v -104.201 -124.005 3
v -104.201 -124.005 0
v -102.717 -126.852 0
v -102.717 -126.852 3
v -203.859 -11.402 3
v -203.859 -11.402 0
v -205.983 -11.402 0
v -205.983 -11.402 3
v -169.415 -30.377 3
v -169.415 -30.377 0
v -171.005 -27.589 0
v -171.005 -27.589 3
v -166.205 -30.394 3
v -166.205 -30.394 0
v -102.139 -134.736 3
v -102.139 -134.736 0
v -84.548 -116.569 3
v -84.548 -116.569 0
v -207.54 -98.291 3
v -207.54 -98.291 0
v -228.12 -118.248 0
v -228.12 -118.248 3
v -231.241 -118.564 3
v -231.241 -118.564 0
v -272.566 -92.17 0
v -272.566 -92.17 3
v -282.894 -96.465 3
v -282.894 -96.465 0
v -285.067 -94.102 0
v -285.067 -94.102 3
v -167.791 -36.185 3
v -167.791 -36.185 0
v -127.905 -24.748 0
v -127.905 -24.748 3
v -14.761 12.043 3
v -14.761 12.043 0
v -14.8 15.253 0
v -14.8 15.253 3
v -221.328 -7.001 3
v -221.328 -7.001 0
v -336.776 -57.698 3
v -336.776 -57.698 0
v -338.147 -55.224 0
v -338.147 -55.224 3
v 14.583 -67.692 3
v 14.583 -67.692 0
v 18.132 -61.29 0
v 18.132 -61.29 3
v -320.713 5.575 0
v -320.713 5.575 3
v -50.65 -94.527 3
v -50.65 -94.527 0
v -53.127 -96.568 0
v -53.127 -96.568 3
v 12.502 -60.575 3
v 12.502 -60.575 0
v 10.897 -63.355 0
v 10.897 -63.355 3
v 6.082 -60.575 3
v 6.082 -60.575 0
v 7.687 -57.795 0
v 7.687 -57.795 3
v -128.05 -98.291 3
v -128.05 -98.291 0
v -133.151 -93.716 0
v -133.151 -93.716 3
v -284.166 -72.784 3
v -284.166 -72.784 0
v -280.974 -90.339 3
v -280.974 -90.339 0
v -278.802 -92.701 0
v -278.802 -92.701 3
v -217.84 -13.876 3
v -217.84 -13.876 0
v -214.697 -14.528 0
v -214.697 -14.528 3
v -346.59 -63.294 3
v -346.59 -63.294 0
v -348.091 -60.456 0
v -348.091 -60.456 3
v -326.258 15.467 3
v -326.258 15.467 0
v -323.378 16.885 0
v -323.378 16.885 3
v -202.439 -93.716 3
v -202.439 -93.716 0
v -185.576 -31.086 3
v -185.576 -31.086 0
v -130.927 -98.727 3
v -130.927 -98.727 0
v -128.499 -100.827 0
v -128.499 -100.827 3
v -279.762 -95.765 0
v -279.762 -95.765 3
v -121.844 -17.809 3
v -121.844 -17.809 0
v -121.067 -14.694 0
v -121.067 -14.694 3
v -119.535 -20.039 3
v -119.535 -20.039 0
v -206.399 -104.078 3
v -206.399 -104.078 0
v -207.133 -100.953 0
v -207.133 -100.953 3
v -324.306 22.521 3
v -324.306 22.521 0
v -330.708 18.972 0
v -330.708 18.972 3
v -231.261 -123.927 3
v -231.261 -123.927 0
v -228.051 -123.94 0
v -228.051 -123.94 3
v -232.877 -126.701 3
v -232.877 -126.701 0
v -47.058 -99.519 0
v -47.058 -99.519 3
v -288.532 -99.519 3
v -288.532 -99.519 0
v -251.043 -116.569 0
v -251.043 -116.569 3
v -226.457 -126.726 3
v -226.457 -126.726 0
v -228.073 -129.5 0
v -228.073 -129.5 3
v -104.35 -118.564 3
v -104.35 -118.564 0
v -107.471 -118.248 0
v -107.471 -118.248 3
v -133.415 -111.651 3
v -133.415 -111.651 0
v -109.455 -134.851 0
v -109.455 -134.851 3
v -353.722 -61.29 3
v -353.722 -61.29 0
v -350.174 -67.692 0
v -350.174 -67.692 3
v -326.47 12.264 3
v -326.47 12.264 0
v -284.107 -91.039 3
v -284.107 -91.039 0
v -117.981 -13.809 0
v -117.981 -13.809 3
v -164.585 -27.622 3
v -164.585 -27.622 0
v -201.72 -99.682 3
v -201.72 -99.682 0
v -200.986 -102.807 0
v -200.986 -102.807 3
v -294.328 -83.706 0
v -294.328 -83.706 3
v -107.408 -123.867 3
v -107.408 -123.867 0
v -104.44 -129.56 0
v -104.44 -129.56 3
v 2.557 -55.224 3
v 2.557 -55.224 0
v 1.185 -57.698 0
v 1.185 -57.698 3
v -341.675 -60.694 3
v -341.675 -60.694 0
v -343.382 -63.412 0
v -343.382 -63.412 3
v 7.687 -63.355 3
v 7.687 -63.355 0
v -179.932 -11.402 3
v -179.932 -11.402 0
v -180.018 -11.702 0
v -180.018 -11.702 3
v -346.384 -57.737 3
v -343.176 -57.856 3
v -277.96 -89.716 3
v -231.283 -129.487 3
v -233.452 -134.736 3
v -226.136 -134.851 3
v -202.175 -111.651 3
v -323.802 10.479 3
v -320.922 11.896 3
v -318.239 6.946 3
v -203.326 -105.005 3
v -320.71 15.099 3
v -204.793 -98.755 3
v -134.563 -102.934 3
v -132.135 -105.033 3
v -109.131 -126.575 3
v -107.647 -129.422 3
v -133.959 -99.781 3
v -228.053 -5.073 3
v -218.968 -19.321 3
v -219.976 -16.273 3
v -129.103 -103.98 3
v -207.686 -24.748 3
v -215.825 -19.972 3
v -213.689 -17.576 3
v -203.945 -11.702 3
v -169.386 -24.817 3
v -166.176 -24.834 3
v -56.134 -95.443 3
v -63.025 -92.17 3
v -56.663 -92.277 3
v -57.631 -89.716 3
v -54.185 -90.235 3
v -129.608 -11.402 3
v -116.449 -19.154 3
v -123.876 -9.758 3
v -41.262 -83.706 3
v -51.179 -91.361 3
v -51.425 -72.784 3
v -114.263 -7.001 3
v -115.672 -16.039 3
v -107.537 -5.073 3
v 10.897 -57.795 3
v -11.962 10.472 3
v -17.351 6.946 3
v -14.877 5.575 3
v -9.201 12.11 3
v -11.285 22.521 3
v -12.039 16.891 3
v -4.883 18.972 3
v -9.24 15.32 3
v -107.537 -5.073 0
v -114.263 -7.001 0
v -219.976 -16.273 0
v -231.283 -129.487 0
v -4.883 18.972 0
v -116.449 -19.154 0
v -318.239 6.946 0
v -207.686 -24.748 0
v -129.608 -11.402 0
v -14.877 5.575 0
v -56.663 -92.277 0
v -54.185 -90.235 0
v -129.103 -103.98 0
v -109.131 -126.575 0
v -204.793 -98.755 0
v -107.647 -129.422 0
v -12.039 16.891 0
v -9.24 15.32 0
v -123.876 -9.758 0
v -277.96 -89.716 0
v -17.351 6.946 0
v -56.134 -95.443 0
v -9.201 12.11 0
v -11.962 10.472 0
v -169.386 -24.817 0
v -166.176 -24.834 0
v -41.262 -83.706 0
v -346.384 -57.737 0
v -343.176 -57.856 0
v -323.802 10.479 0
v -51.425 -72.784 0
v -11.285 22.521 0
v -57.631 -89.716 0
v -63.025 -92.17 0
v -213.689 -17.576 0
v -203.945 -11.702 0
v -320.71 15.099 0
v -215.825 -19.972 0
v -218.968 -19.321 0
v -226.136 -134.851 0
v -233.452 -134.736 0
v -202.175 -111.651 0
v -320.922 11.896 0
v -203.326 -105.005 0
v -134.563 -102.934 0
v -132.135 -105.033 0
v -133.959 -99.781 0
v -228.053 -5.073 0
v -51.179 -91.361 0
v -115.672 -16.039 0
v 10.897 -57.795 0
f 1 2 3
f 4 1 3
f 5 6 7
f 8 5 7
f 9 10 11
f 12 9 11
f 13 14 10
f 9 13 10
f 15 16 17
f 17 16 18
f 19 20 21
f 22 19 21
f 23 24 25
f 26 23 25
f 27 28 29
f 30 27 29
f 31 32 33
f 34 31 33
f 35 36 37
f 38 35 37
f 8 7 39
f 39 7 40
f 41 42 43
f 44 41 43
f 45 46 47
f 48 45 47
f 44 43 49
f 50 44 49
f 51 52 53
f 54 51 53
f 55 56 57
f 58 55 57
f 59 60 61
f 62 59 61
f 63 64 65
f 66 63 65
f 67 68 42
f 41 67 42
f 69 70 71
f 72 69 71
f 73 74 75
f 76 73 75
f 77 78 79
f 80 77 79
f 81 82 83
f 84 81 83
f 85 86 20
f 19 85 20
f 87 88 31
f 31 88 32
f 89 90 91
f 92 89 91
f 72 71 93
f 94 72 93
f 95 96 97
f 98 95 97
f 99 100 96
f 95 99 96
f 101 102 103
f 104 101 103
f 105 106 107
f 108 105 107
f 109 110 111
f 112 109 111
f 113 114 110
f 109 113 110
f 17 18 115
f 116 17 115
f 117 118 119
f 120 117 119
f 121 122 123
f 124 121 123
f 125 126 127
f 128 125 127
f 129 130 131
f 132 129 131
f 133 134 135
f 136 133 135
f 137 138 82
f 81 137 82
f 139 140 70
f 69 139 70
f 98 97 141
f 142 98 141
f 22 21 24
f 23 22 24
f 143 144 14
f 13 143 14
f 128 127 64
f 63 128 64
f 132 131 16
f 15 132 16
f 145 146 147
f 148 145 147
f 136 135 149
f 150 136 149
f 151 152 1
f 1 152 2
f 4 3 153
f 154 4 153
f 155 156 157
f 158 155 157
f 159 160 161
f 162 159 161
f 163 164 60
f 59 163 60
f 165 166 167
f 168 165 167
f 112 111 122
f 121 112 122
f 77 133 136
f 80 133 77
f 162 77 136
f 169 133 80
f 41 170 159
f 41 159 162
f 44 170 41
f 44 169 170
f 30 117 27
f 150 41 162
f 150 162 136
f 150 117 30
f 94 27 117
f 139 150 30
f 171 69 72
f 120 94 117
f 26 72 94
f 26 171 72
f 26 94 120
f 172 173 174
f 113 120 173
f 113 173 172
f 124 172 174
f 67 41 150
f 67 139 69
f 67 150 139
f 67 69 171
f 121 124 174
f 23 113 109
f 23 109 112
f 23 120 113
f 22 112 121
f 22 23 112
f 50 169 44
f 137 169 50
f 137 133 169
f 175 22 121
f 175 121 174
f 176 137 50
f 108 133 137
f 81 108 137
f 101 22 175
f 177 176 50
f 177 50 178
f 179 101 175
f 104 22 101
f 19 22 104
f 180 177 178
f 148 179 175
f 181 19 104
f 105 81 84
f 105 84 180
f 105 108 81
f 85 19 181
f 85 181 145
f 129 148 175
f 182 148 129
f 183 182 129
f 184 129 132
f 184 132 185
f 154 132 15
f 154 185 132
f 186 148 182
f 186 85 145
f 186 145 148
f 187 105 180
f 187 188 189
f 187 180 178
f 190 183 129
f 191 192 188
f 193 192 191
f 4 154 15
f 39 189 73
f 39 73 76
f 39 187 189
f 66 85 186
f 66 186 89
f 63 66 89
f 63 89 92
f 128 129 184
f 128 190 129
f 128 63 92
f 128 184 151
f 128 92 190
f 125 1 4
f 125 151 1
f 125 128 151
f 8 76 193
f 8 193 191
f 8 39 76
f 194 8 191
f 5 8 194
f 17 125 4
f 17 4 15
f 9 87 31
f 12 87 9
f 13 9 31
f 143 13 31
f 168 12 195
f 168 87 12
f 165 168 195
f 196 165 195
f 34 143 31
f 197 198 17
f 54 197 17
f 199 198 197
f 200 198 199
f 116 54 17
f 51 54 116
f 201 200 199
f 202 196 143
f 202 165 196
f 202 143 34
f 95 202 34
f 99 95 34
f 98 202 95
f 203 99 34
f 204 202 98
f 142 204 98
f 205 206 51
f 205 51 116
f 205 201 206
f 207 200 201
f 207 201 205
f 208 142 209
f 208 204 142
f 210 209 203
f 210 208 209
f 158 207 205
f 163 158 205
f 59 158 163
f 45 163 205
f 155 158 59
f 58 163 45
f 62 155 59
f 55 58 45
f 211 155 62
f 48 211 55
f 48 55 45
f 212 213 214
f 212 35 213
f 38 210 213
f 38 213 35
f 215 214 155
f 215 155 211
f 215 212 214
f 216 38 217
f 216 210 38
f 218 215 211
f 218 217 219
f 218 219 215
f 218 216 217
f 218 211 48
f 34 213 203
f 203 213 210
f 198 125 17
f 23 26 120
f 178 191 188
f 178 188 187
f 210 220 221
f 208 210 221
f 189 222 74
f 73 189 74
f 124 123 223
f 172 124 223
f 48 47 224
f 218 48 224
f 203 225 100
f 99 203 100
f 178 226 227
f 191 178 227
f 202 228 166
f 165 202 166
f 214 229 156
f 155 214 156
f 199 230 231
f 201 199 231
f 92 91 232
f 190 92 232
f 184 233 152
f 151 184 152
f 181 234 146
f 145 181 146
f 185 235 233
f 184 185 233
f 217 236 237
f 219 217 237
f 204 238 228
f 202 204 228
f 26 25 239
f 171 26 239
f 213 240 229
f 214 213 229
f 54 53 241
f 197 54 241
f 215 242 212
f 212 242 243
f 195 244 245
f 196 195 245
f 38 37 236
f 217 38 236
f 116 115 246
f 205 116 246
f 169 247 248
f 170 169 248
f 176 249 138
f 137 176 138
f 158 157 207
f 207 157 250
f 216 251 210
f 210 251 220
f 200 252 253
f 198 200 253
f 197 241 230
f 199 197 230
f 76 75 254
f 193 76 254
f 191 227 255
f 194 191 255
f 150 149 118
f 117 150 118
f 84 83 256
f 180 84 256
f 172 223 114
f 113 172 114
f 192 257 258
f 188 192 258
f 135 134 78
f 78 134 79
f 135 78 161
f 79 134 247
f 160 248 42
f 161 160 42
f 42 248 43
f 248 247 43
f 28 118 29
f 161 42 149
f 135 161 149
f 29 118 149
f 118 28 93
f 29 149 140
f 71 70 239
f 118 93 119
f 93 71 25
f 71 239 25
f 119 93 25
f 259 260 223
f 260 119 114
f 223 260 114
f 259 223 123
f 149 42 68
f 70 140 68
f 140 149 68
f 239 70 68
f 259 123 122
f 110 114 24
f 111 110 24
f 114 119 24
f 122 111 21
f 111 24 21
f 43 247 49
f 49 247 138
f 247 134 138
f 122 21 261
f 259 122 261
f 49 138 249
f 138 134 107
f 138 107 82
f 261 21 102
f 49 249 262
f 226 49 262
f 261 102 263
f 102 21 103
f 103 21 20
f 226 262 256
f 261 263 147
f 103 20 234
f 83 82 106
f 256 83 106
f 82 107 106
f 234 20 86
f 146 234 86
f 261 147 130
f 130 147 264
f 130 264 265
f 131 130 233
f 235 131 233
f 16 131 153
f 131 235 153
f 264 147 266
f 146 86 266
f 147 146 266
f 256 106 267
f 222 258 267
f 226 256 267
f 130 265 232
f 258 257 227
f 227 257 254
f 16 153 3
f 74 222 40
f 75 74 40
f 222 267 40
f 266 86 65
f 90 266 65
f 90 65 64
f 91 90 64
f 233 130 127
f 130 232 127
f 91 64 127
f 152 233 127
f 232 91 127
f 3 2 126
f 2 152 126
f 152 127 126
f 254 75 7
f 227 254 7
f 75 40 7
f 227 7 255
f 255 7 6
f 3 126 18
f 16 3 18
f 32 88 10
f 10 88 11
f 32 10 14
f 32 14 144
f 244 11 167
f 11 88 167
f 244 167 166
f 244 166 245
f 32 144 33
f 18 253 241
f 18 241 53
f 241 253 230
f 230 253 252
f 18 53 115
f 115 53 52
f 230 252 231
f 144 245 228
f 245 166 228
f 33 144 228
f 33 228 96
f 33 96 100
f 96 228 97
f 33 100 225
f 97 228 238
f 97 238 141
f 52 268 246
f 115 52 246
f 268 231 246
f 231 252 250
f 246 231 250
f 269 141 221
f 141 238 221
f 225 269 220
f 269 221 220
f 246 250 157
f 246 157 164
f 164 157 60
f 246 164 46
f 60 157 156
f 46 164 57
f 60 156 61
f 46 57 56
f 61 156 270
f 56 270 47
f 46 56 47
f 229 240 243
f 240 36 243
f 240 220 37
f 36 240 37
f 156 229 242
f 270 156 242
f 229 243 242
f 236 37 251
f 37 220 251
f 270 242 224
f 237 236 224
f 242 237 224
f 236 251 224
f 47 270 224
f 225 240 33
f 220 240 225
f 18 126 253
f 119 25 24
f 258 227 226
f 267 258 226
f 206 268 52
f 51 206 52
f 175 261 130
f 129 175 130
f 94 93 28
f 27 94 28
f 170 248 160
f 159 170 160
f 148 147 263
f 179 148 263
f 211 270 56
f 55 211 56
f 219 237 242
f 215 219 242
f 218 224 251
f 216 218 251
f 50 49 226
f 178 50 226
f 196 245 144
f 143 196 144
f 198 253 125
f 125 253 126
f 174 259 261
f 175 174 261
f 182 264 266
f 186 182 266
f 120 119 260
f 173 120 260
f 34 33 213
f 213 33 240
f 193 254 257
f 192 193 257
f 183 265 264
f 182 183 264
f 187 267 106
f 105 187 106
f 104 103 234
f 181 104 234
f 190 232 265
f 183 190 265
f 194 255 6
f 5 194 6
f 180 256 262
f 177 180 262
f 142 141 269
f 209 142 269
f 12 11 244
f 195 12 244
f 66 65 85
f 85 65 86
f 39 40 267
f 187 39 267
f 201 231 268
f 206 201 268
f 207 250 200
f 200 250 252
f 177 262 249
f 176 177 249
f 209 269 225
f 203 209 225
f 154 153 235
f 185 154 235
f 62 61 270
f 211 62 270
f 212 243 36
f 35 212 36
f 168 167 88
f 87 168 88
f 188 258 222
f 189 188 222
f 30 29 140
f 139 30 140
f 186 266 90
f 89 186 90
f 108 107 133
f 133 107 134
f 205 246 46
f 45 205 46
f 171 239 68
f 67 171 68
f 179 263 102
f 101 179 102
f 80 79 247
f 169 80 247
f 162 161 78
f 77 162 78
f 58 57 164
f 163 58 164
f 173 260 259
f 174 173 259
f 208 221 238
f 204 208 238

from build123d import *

# Parameters (mm, degrees)
BOSS_EXTRU_1_DEPTH = 3


with BuildPart() as part:
    # Esquisse1 → Boss.-Extru.1 (new body)
    with BuildSketch(Plane.XY):
        Polygon((-179.931816419, -11.401531345), (-180.017838024, -11.701531345), (-185.57619805, -31.086289447), (-167.791072806, -36.185021562), (-127.904950096, -24.747859919), (-17.351203316, 6.946262636), (-14.877374555, 5.574907028), (2.556514314, -55.224288823), (1.185265633, -57.698086926), (-51.424530344, -72.783703169), (-57.630729871, -89.716454796), (-63.024672228, -92.169507978), (-104.349665635, -118.563827288), (-107.470944884, -118.248029963), (-128.050089261, -98.290842938), (-133.151477342, -93.715936913), (-202.439042401, -93.715936913), (-207.540430482, -98.290842938), (-228.119574859, -118.248029963), (-231.240854108, -118.563827288), (-272.565847516, -92.169507978), (-277.959789872, -89.716454796), (-284.165989399, -72.783703169), (-336.775785376, -57.698086926), (-338.147034057, -55.224288823), (-320.713145188, 5.574907028), (-318.239316427, 6.946262636), (-207.685569647, -24.747859919), (-203.944682562, -11.701531345), (-203.858660957, -11.401531345), (-205.982988252, -11.401531345), (-221.327812729, -7.001473731), (-228.053301524, -5.072970852), (-324.305573392, 22.521130566), (-330.707501003, 18.97225141), (-353.72243999, -61.290379239), (-350.173829458, -67.692242105), (-294.328030452, -83.705767284), (-288.532091821, -99.519179156), (-251.042661762, -116.568594893), (-233.45174982, -134.735979634), (-226.135810249, -134.851076098), (-202.175390102, -111.650948678), (-133.415129641, -111.650948678), (-109.454709494, -134.851076098), (-102.138769923, -134.735979634), (-84.547857981, -116.568594893), (-47.058427922, -99.519179156), (-41.262489291, -83.705767284), (14.583309715, -67.692242105), (18.131920247, -61.290379239), (-4.88301874, 18.97225141), (-11.284946351, 22.521130566), (-107.537218219, -5.072970852), (-114.262707014, -7.001473731), (-123.876268292, -9.758118068), (-129.607531491, -11.401531345), (-167.175777529, -11.401531345), align=None)
        Polygon((-226.456549288, -126.726039887), (-228.072581173, -129.499661036), (-231.282623491, -129.486946945), (-232.876633924, -126.700611704), (-231.260602039, -123.926990555), (-228.050559721, -123.939704646), align=None, mode=Mode.SUBTRACT)
        Polygon((-201.720052379, -99.68218544), (-200.986265397, -102.807259839), (-203.325765724, -105.005275206), (-206.399053033, -104.078216174), (-207.132840016, -100.953141775), (-204.793339689, -98.755126408), align=None, mode=Mode.SUBTRACT)
        Polygon((-278.801584282, -92.701419409), (-279.761510176, -95.764600045), (-282.89426537, -96.464870154), (-285.067094671, -94.101959627), (-284.107168778, -91.03877899), (-280.974413583, -90.338508881), align=None, mode=Mode.SUBTRACT)
        Polygon((-341.674936445, -60.693756917), (-343.381773974, -63.412440235), (-346.589641557, -63.293617233), (-348.09067161, -60.456110913), (-346.38383408, -57.737427596), (-343.175966498, -57.856250598), align=None, mode=Mode.SUBTRACT)
        Polygon((-102.716844109, -126.851692582), (-104.440215275, -129.559925429), (-107.647299303, -129.421558643), (-109.131012166, -126.574959009), (-107.407640999, -123.866726161), (-104.200556971, -124.005092948), align=None, mode=Mode.SUBTRACT)
        Polygon((-129.102521286, -103.979530359), (-132.134816884, -105.032961295), (-134.563262635, -102.933631743), (-133.959412787, -99.780871255), (-130.927117189, -98.727440319), (-128.498671438, -100.826769871), align=None, mode=Mode.SUBTRACT)
        Polygon((-51.178552765, -91.36063702), (-50.649763202, -94.526851626), (-53.127390703, -96.567904124), (-56.133807767, -95.442742016), (-56.662597331, -92.27652741), (-54.18496983, -90.235474912), align=None, mode=Mode.SUBTRACT)
        Polygon((10.897318032, -57.794933915), (12.502351781, -60.574933915), (10.897318032, -63.354933915), (7.687250536, -63.354933915), (6.082216787, -60.574933915), (7.687250536, -57.794933915), align=None, mode=Mode.SUBTRACT)
        Polygon((-217.840116073, -13.876277124), (-214.696831686, -14.527657653), (-213.689301579, -17.575512049), (-215.825055858, -19.971985915), (-218.968340246, -19.320605385), (-219.975870353, -16.272750989), align=None, mode=Mode.SUBTRACT)
        Polygon((-326.25776259, 15.467139628), (-323.377643582, 16.884689567), (-320.709949819, 15.09920831), (-320.922375064, 11.896177113), (-323.802494072, 10.478627174), (-326.470187835, 12.264108431), align=None, mode=Mode.SUBTRACT)
        Polygon((-169.385770719, -24.817214521), (-166.175746894, -24.833958909), (-164.585236046, -27.622293282), (-166.204749024, -30.393883267), (-169.414772849, -30.37713888), (-171.005283697, -27.588804506), align=None, mode=Mode.SUBTRACT)
        Polygon((-117.981174931, -13.809459943), (-115.672169645, -16.039488624), (-116.448928491, -19.154160201), (-119.534692623, -20.038803095), (-121.84369791, -17.808774414), (-121.066939064, -14.694102838), align=None, mode=Mode.SUBTRACT)
        Polygon((-12.039253575, 16.891491339), (-9.240055353, 15.320178943), (-9.201252694, 12.110345974), (-11.961648258, 10.471825402), (-14.76084648, 12.043137798), (-14.799649138, 15.252970767), align=None, mode=Mode.SUBTRACT)
    extrude(amount=BOSS_EXTRU_1_DEPTH)


solid = part.part
